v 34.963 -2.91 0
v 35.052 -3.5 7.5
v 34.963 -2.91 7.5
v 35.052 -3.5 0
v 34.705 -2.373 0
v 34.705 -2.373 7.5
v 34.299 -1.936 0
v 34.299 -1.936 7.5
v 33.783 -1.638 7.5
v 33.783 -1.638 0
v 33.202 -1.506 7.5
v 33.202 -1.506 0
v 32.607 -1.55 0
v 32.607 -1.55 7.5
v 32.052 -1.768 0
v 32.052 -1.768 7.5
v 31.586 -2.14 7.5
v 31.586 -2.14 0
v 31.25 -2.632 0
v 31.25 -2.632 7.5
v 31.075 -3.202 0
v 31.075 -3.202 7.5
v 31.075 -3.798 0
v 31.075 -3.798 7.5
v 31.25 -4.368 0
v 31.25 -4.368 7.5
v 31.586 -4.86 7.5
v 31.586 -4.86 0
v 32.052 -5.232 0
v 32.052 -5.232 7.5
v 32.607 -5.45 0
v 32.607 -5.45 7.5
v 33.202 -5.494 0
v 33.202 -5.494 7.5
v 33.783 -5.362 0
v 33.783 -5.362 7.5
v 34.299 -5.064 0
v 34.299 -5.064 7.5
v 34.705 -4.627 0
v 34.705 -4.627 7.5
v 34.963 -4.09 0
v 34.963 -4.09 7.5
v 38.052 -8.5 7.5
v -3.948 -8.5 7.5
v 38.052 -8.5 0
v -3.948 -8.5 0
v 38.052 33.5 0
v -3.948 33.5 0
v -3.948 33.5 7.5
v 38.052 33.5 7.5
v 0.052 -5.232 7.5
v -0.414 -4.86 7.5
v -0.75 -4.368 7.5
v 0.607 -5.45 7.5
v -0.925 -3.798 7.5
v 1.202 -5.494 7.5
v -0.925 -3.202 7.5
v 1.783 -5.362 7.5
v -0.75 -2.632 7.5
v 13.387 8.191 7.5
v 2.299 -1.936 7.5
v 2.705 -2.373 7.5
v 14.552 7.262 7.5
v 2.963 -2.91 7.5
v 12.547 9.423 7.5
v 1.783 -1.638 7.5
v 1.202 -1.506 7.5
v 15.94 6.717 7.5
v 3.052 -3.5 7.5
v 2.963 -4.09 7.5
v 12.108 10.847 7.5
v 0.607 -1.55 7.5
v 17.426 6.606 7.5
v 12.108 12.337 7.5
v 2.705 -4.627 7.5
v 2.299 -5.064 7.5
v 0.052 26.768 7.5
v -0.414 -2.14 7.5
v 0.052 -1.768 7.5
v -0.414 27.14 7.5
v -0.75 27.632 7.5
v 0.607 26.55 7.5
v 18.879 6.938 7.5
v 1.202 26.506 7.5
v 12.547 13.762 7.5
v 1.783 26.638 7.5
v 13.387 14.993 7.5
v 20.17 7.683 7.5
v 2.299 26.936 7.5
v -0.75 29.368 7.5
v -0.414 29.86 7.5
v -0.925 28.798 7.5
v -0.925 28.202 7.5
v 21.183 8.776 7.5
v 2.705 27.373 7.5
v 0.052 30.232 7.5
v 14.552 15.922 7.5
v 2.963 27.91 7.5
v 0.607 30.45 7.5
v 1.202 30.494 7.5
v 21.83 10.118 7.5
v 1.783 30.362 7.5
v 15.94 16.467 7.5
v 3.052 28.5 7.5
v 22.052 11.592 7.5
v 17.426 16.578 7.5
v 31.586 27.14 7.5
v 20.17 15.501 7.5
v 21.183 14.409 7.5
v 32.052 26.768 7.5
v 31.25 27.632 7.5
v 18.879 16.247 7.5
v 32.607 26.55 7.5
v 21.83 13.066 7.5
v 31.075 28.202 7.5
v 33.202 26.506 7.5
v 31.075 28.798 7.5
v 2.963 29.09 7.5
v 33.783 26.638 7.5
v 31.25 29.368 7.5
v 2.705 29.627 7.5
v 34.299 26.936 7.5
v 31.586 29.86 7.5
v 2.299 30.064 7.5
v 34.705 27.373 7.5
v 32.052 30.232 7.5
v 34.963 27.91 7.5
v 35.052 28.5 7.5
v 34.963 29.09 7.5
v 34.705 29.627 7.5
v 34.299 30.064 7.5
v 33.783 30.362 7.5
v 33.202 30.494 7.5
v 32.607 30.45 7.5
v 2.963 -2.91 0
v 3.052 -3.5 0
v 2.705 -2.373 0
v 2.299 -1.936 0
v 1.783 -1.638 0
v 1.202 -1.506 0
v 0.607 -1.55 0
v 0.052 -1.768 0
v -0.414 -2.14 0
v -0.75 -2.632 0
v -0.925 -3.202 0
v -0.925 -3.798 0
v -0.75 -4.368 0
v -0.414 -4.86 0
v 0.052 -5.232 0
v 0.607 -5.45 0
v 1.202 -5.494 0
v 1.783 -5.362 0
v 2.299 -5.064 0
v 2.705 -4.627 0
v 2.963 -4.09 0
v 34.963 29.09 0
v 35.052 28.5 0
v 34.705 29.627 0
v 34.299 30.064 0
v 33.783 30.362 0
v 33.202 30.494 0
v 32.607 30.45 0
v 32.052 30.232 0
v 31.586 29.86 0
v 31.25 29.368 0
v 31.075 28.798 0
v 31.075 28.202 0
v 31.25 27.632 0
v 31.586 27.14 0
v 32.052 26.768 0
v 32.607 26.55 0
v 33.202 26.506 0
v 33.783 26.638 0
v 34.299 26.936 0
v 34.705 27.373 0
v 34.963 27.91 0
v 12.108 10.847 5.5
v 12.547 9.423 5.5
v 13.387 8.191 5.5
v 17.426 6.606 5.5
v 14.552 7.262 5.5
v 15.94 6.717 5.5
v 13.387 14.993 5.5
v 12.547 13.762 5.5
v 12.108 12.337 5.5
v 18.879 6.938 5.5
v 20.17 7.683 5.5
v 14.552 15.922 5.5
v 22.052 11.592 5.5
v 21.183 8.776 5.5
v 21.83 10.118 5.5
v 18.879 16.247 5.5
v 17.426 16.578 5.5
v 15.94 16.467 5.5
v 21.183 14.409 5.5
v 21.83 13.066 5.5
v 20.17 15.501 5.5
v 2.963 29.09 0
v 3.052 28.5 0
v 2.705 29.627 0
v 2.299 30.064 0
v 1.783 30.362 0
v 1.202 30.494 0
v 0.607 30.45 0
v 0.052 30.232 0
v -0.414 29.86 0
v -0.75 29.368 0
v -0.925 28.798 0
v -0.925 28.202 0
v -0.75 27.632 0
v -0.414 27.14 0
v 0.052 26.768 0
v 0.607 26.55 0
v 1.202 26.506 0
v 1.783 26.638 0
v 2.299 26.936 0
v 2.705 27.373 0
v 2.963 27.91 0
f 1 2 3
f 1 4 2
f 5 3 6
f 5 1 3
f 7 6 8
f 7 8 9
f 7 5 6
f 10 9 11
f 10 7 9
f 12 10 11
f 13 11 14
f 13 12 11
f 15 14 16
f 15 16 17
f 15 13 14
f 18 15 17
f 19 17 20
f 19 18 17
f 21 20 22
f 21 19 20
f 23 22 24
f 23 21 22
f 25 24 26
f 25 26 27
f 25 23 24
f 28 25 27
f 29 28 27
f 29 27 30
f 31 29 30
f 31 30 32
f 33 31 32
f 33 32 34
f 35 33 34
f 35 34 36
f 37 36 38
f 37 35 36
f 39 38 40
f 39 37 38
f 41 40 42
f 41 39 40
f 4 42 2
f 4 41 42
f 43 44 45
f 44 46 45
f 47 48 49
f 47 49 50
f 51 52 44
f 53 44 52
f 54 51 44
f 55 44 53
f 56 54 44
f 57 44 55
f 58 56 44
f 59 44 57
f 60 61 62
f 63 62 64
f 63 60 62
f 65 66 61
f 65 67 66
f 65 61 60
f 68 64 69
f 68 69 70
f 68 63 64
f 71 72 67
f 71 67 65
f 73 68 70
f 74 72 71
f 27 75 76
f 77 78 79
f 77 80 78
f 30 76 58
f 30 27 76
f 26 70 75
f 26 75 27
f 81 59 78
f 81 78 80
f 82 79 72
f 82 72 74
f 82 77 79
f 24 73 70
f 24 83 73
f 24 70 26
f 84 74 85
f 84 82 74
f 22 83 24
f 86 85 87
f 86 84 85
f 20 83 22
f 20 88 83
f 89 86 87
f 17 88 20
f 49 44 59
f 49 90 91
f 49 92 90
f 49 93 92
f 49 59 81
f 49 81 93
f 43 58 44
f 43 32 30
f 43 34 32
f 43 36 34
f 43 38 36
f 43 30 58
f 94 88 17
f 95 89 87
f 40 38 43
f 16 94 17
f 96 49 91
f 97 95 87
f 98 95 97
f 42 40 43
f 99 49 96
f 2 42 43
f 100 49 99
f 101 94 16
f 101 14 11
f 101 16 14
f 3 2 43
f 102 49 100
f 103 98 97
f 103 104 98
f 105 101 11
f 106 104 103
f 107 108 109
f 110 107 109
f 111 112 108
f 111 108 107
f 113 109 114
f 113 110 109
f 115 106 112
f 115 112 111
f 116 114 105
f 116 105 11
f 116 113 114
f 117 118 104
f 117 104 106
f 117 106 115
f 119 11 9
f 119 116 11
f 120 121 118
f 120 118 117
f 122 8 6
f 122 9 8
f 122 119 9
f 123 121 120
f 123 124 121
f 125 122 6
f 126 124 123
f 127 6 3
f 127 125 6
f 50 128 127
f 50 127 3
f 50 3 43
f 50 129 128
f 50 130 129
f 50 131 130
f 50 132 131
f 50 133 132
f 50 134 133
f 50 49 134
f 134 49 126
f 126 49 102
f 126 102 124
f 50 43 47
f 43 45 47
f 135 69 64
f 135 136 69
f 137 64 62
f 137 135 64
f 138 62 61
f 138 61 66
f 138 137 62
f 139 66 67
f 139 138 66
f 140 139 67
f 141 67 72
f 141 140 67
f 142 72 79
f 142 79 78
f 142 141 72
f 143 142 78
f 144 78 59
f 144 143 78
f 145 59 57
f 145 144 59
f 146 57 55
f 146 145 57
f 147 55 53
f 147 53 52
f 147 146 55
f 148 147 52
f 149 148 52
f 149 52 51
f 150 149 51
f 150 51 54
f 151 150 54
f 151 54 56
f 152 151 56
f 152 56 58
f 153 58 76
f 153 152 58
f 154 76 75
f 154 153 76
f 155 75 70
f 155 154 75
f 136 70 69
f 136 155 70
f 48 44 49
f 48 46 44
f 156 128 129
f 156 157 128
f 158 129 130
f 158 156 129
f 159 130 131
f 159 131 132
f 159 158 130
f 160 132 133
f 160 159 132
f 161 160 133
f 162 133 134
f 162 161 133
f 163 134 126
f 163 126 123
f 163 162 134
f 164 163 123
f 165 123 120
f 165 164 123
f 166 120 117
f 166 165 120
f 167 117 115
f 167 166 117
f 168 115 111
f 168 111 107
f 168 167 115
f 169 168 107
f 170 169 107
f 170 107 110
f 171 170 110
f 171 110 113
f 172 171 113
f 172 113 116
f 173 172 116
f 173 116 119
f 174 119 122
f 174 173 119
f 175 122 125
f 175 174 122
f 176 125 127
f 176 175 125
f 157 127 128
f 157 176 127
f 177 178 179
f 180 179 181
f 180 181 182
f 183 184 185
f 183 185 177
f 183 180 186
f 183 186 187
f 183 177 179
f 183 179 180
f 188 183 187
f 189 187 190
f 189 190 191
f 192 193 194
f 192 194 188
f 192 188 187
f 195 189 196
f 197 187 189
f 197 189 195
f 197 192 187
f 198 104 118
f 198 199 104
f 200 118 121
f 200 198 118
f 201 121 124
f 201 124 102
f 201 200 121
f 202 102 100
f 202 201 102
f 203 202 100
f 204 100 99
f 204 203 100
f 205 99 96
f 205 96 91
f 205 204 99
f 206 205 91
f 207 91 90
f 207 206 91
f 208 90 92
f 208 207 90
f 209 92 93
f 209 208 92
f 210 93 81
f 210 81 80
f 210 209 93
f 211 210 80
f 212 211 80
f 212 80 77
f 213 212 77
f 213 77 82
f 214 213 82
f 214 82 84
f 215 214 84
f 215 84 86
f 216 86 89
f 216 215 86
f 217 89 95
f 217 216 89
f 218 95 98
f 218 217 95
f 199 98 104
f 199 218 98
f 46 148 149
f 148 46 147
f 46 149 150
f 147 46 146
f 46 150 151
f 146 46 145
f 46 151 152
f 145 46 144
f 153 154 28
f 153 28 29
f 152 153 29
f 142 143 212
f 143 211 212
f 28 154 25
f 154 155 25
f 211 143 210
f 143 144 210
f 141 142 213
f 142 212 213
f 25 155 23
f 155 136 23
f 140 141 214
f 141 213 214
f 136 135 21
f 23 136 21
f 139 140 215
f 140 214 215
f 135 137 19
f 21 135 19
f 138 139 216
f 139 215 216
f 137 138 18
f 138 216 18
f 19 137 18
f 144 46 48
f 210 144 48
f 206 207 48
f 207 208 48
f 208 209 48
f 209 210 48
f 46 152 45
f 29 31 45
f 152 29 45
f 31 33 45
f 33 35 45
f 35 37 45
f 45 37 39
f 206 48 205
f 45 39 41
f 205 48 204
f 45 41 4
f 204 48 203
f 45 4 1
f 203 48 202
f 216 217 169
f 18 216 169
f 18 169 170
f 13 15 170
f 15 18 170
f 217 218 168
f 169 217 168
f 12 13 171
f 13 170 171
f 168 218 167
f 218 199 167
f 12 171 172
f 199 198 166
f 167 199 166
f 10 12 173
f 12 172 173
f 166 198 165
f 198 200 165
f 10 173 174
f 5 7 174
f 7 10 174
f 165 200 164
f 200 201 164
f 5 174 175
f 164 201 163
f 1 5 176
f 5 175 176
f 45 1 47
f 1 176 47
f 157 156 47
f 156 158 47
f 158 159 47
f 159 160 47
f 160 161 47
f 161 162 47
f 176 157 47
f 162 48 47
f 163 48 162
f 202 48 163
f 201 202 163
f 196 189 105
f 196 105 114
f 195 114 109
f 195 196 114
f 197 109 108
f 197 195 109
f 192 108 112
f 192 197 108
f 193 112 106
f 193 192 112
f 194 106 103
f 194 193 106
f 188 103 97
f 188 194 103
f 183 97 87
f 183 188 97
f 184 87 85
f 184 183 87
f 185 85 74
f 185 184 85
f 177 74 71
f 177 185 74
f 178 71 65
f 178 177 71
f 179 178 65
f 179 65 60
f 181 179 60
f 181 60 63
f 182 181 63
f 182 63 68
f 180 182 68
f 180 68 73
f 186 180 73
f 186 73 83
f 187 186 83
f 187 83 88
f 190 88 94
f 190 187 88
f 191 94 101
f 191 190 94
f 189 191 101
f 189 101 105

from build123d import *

# Parameters (mm, degrees)
SKETCH2_W           = 42
SKETCH2_H           = 42
SKETCH2_R           = 2
BOSS_EXTRUDE3_DEPTH = 5.5
SKETCH5_W           = 42
SKETCH5_H           = 42
SKETCH5_R           = 2
SKETCH5_R_2         = 5
BOSS_EXTRUDE5_DEPTH = 2


with BuildPart() as part:
    # Sketch2 → Boss-Extrude3 (new body)
    with BuildSketch(Plane.XY):
        with Locations((17.05217694, 12.5)):
            Rectangle(SKETCH2_W, SKETCH2_H)
        with Locations((1.05217694, 28.5)):
            Circle(SKETCH2_R, mode=Mode.SUBTRACT)
        with Locations((1.05217694, -3.5)):
            Circle(SKETCH2_R, mode=Mode.SUBTRACT)
        with Locations((33.05217694, -3.5)):
            Circle(SKETCH2_R, mode=Mode.SUBTRACT)
        with Locations((33.05217694, 28.5)):
            Circle(SKETCH2_R, mode=Mode.SUBTRACT)
    extrude(amount=BOSS_EXTRUDE3_DEPTH)

    # Sketch5 → Boss-Extrude5 (add)
    with BuildSketch(Plane.XY.offset(5.5)):
        with Locations((17.05217694, 12.5)):
            Rectangle(SKETCH5_W, SKETCH5_H)
        with Locations((1.05217694, 28.5)):
            Circle(SKETCH5_R, mode=Mode.SUBTRACT)
        with Locations((33.05217694, 28.5)):
            Circle(SKETCH5_R, mode=Mode.SUBTRACT)
        with Locations((1.05217694, -3.5)):
            Circle(SKETCH5_R, mode=Mode.SUBTRACT)
        with Locations((33.05217694, -3.5)):
            Circle(SKETCH5_R, mode=Mode.SUBTRACT)
        with Locations((17.05217694, 11.592136271)):
            Circle(SKETCH5_R_2, mode=Mode.SUBTRACT)
    extrude(amount=BOSS_EXTRUDE5_DEPTH)


solid = part.part
